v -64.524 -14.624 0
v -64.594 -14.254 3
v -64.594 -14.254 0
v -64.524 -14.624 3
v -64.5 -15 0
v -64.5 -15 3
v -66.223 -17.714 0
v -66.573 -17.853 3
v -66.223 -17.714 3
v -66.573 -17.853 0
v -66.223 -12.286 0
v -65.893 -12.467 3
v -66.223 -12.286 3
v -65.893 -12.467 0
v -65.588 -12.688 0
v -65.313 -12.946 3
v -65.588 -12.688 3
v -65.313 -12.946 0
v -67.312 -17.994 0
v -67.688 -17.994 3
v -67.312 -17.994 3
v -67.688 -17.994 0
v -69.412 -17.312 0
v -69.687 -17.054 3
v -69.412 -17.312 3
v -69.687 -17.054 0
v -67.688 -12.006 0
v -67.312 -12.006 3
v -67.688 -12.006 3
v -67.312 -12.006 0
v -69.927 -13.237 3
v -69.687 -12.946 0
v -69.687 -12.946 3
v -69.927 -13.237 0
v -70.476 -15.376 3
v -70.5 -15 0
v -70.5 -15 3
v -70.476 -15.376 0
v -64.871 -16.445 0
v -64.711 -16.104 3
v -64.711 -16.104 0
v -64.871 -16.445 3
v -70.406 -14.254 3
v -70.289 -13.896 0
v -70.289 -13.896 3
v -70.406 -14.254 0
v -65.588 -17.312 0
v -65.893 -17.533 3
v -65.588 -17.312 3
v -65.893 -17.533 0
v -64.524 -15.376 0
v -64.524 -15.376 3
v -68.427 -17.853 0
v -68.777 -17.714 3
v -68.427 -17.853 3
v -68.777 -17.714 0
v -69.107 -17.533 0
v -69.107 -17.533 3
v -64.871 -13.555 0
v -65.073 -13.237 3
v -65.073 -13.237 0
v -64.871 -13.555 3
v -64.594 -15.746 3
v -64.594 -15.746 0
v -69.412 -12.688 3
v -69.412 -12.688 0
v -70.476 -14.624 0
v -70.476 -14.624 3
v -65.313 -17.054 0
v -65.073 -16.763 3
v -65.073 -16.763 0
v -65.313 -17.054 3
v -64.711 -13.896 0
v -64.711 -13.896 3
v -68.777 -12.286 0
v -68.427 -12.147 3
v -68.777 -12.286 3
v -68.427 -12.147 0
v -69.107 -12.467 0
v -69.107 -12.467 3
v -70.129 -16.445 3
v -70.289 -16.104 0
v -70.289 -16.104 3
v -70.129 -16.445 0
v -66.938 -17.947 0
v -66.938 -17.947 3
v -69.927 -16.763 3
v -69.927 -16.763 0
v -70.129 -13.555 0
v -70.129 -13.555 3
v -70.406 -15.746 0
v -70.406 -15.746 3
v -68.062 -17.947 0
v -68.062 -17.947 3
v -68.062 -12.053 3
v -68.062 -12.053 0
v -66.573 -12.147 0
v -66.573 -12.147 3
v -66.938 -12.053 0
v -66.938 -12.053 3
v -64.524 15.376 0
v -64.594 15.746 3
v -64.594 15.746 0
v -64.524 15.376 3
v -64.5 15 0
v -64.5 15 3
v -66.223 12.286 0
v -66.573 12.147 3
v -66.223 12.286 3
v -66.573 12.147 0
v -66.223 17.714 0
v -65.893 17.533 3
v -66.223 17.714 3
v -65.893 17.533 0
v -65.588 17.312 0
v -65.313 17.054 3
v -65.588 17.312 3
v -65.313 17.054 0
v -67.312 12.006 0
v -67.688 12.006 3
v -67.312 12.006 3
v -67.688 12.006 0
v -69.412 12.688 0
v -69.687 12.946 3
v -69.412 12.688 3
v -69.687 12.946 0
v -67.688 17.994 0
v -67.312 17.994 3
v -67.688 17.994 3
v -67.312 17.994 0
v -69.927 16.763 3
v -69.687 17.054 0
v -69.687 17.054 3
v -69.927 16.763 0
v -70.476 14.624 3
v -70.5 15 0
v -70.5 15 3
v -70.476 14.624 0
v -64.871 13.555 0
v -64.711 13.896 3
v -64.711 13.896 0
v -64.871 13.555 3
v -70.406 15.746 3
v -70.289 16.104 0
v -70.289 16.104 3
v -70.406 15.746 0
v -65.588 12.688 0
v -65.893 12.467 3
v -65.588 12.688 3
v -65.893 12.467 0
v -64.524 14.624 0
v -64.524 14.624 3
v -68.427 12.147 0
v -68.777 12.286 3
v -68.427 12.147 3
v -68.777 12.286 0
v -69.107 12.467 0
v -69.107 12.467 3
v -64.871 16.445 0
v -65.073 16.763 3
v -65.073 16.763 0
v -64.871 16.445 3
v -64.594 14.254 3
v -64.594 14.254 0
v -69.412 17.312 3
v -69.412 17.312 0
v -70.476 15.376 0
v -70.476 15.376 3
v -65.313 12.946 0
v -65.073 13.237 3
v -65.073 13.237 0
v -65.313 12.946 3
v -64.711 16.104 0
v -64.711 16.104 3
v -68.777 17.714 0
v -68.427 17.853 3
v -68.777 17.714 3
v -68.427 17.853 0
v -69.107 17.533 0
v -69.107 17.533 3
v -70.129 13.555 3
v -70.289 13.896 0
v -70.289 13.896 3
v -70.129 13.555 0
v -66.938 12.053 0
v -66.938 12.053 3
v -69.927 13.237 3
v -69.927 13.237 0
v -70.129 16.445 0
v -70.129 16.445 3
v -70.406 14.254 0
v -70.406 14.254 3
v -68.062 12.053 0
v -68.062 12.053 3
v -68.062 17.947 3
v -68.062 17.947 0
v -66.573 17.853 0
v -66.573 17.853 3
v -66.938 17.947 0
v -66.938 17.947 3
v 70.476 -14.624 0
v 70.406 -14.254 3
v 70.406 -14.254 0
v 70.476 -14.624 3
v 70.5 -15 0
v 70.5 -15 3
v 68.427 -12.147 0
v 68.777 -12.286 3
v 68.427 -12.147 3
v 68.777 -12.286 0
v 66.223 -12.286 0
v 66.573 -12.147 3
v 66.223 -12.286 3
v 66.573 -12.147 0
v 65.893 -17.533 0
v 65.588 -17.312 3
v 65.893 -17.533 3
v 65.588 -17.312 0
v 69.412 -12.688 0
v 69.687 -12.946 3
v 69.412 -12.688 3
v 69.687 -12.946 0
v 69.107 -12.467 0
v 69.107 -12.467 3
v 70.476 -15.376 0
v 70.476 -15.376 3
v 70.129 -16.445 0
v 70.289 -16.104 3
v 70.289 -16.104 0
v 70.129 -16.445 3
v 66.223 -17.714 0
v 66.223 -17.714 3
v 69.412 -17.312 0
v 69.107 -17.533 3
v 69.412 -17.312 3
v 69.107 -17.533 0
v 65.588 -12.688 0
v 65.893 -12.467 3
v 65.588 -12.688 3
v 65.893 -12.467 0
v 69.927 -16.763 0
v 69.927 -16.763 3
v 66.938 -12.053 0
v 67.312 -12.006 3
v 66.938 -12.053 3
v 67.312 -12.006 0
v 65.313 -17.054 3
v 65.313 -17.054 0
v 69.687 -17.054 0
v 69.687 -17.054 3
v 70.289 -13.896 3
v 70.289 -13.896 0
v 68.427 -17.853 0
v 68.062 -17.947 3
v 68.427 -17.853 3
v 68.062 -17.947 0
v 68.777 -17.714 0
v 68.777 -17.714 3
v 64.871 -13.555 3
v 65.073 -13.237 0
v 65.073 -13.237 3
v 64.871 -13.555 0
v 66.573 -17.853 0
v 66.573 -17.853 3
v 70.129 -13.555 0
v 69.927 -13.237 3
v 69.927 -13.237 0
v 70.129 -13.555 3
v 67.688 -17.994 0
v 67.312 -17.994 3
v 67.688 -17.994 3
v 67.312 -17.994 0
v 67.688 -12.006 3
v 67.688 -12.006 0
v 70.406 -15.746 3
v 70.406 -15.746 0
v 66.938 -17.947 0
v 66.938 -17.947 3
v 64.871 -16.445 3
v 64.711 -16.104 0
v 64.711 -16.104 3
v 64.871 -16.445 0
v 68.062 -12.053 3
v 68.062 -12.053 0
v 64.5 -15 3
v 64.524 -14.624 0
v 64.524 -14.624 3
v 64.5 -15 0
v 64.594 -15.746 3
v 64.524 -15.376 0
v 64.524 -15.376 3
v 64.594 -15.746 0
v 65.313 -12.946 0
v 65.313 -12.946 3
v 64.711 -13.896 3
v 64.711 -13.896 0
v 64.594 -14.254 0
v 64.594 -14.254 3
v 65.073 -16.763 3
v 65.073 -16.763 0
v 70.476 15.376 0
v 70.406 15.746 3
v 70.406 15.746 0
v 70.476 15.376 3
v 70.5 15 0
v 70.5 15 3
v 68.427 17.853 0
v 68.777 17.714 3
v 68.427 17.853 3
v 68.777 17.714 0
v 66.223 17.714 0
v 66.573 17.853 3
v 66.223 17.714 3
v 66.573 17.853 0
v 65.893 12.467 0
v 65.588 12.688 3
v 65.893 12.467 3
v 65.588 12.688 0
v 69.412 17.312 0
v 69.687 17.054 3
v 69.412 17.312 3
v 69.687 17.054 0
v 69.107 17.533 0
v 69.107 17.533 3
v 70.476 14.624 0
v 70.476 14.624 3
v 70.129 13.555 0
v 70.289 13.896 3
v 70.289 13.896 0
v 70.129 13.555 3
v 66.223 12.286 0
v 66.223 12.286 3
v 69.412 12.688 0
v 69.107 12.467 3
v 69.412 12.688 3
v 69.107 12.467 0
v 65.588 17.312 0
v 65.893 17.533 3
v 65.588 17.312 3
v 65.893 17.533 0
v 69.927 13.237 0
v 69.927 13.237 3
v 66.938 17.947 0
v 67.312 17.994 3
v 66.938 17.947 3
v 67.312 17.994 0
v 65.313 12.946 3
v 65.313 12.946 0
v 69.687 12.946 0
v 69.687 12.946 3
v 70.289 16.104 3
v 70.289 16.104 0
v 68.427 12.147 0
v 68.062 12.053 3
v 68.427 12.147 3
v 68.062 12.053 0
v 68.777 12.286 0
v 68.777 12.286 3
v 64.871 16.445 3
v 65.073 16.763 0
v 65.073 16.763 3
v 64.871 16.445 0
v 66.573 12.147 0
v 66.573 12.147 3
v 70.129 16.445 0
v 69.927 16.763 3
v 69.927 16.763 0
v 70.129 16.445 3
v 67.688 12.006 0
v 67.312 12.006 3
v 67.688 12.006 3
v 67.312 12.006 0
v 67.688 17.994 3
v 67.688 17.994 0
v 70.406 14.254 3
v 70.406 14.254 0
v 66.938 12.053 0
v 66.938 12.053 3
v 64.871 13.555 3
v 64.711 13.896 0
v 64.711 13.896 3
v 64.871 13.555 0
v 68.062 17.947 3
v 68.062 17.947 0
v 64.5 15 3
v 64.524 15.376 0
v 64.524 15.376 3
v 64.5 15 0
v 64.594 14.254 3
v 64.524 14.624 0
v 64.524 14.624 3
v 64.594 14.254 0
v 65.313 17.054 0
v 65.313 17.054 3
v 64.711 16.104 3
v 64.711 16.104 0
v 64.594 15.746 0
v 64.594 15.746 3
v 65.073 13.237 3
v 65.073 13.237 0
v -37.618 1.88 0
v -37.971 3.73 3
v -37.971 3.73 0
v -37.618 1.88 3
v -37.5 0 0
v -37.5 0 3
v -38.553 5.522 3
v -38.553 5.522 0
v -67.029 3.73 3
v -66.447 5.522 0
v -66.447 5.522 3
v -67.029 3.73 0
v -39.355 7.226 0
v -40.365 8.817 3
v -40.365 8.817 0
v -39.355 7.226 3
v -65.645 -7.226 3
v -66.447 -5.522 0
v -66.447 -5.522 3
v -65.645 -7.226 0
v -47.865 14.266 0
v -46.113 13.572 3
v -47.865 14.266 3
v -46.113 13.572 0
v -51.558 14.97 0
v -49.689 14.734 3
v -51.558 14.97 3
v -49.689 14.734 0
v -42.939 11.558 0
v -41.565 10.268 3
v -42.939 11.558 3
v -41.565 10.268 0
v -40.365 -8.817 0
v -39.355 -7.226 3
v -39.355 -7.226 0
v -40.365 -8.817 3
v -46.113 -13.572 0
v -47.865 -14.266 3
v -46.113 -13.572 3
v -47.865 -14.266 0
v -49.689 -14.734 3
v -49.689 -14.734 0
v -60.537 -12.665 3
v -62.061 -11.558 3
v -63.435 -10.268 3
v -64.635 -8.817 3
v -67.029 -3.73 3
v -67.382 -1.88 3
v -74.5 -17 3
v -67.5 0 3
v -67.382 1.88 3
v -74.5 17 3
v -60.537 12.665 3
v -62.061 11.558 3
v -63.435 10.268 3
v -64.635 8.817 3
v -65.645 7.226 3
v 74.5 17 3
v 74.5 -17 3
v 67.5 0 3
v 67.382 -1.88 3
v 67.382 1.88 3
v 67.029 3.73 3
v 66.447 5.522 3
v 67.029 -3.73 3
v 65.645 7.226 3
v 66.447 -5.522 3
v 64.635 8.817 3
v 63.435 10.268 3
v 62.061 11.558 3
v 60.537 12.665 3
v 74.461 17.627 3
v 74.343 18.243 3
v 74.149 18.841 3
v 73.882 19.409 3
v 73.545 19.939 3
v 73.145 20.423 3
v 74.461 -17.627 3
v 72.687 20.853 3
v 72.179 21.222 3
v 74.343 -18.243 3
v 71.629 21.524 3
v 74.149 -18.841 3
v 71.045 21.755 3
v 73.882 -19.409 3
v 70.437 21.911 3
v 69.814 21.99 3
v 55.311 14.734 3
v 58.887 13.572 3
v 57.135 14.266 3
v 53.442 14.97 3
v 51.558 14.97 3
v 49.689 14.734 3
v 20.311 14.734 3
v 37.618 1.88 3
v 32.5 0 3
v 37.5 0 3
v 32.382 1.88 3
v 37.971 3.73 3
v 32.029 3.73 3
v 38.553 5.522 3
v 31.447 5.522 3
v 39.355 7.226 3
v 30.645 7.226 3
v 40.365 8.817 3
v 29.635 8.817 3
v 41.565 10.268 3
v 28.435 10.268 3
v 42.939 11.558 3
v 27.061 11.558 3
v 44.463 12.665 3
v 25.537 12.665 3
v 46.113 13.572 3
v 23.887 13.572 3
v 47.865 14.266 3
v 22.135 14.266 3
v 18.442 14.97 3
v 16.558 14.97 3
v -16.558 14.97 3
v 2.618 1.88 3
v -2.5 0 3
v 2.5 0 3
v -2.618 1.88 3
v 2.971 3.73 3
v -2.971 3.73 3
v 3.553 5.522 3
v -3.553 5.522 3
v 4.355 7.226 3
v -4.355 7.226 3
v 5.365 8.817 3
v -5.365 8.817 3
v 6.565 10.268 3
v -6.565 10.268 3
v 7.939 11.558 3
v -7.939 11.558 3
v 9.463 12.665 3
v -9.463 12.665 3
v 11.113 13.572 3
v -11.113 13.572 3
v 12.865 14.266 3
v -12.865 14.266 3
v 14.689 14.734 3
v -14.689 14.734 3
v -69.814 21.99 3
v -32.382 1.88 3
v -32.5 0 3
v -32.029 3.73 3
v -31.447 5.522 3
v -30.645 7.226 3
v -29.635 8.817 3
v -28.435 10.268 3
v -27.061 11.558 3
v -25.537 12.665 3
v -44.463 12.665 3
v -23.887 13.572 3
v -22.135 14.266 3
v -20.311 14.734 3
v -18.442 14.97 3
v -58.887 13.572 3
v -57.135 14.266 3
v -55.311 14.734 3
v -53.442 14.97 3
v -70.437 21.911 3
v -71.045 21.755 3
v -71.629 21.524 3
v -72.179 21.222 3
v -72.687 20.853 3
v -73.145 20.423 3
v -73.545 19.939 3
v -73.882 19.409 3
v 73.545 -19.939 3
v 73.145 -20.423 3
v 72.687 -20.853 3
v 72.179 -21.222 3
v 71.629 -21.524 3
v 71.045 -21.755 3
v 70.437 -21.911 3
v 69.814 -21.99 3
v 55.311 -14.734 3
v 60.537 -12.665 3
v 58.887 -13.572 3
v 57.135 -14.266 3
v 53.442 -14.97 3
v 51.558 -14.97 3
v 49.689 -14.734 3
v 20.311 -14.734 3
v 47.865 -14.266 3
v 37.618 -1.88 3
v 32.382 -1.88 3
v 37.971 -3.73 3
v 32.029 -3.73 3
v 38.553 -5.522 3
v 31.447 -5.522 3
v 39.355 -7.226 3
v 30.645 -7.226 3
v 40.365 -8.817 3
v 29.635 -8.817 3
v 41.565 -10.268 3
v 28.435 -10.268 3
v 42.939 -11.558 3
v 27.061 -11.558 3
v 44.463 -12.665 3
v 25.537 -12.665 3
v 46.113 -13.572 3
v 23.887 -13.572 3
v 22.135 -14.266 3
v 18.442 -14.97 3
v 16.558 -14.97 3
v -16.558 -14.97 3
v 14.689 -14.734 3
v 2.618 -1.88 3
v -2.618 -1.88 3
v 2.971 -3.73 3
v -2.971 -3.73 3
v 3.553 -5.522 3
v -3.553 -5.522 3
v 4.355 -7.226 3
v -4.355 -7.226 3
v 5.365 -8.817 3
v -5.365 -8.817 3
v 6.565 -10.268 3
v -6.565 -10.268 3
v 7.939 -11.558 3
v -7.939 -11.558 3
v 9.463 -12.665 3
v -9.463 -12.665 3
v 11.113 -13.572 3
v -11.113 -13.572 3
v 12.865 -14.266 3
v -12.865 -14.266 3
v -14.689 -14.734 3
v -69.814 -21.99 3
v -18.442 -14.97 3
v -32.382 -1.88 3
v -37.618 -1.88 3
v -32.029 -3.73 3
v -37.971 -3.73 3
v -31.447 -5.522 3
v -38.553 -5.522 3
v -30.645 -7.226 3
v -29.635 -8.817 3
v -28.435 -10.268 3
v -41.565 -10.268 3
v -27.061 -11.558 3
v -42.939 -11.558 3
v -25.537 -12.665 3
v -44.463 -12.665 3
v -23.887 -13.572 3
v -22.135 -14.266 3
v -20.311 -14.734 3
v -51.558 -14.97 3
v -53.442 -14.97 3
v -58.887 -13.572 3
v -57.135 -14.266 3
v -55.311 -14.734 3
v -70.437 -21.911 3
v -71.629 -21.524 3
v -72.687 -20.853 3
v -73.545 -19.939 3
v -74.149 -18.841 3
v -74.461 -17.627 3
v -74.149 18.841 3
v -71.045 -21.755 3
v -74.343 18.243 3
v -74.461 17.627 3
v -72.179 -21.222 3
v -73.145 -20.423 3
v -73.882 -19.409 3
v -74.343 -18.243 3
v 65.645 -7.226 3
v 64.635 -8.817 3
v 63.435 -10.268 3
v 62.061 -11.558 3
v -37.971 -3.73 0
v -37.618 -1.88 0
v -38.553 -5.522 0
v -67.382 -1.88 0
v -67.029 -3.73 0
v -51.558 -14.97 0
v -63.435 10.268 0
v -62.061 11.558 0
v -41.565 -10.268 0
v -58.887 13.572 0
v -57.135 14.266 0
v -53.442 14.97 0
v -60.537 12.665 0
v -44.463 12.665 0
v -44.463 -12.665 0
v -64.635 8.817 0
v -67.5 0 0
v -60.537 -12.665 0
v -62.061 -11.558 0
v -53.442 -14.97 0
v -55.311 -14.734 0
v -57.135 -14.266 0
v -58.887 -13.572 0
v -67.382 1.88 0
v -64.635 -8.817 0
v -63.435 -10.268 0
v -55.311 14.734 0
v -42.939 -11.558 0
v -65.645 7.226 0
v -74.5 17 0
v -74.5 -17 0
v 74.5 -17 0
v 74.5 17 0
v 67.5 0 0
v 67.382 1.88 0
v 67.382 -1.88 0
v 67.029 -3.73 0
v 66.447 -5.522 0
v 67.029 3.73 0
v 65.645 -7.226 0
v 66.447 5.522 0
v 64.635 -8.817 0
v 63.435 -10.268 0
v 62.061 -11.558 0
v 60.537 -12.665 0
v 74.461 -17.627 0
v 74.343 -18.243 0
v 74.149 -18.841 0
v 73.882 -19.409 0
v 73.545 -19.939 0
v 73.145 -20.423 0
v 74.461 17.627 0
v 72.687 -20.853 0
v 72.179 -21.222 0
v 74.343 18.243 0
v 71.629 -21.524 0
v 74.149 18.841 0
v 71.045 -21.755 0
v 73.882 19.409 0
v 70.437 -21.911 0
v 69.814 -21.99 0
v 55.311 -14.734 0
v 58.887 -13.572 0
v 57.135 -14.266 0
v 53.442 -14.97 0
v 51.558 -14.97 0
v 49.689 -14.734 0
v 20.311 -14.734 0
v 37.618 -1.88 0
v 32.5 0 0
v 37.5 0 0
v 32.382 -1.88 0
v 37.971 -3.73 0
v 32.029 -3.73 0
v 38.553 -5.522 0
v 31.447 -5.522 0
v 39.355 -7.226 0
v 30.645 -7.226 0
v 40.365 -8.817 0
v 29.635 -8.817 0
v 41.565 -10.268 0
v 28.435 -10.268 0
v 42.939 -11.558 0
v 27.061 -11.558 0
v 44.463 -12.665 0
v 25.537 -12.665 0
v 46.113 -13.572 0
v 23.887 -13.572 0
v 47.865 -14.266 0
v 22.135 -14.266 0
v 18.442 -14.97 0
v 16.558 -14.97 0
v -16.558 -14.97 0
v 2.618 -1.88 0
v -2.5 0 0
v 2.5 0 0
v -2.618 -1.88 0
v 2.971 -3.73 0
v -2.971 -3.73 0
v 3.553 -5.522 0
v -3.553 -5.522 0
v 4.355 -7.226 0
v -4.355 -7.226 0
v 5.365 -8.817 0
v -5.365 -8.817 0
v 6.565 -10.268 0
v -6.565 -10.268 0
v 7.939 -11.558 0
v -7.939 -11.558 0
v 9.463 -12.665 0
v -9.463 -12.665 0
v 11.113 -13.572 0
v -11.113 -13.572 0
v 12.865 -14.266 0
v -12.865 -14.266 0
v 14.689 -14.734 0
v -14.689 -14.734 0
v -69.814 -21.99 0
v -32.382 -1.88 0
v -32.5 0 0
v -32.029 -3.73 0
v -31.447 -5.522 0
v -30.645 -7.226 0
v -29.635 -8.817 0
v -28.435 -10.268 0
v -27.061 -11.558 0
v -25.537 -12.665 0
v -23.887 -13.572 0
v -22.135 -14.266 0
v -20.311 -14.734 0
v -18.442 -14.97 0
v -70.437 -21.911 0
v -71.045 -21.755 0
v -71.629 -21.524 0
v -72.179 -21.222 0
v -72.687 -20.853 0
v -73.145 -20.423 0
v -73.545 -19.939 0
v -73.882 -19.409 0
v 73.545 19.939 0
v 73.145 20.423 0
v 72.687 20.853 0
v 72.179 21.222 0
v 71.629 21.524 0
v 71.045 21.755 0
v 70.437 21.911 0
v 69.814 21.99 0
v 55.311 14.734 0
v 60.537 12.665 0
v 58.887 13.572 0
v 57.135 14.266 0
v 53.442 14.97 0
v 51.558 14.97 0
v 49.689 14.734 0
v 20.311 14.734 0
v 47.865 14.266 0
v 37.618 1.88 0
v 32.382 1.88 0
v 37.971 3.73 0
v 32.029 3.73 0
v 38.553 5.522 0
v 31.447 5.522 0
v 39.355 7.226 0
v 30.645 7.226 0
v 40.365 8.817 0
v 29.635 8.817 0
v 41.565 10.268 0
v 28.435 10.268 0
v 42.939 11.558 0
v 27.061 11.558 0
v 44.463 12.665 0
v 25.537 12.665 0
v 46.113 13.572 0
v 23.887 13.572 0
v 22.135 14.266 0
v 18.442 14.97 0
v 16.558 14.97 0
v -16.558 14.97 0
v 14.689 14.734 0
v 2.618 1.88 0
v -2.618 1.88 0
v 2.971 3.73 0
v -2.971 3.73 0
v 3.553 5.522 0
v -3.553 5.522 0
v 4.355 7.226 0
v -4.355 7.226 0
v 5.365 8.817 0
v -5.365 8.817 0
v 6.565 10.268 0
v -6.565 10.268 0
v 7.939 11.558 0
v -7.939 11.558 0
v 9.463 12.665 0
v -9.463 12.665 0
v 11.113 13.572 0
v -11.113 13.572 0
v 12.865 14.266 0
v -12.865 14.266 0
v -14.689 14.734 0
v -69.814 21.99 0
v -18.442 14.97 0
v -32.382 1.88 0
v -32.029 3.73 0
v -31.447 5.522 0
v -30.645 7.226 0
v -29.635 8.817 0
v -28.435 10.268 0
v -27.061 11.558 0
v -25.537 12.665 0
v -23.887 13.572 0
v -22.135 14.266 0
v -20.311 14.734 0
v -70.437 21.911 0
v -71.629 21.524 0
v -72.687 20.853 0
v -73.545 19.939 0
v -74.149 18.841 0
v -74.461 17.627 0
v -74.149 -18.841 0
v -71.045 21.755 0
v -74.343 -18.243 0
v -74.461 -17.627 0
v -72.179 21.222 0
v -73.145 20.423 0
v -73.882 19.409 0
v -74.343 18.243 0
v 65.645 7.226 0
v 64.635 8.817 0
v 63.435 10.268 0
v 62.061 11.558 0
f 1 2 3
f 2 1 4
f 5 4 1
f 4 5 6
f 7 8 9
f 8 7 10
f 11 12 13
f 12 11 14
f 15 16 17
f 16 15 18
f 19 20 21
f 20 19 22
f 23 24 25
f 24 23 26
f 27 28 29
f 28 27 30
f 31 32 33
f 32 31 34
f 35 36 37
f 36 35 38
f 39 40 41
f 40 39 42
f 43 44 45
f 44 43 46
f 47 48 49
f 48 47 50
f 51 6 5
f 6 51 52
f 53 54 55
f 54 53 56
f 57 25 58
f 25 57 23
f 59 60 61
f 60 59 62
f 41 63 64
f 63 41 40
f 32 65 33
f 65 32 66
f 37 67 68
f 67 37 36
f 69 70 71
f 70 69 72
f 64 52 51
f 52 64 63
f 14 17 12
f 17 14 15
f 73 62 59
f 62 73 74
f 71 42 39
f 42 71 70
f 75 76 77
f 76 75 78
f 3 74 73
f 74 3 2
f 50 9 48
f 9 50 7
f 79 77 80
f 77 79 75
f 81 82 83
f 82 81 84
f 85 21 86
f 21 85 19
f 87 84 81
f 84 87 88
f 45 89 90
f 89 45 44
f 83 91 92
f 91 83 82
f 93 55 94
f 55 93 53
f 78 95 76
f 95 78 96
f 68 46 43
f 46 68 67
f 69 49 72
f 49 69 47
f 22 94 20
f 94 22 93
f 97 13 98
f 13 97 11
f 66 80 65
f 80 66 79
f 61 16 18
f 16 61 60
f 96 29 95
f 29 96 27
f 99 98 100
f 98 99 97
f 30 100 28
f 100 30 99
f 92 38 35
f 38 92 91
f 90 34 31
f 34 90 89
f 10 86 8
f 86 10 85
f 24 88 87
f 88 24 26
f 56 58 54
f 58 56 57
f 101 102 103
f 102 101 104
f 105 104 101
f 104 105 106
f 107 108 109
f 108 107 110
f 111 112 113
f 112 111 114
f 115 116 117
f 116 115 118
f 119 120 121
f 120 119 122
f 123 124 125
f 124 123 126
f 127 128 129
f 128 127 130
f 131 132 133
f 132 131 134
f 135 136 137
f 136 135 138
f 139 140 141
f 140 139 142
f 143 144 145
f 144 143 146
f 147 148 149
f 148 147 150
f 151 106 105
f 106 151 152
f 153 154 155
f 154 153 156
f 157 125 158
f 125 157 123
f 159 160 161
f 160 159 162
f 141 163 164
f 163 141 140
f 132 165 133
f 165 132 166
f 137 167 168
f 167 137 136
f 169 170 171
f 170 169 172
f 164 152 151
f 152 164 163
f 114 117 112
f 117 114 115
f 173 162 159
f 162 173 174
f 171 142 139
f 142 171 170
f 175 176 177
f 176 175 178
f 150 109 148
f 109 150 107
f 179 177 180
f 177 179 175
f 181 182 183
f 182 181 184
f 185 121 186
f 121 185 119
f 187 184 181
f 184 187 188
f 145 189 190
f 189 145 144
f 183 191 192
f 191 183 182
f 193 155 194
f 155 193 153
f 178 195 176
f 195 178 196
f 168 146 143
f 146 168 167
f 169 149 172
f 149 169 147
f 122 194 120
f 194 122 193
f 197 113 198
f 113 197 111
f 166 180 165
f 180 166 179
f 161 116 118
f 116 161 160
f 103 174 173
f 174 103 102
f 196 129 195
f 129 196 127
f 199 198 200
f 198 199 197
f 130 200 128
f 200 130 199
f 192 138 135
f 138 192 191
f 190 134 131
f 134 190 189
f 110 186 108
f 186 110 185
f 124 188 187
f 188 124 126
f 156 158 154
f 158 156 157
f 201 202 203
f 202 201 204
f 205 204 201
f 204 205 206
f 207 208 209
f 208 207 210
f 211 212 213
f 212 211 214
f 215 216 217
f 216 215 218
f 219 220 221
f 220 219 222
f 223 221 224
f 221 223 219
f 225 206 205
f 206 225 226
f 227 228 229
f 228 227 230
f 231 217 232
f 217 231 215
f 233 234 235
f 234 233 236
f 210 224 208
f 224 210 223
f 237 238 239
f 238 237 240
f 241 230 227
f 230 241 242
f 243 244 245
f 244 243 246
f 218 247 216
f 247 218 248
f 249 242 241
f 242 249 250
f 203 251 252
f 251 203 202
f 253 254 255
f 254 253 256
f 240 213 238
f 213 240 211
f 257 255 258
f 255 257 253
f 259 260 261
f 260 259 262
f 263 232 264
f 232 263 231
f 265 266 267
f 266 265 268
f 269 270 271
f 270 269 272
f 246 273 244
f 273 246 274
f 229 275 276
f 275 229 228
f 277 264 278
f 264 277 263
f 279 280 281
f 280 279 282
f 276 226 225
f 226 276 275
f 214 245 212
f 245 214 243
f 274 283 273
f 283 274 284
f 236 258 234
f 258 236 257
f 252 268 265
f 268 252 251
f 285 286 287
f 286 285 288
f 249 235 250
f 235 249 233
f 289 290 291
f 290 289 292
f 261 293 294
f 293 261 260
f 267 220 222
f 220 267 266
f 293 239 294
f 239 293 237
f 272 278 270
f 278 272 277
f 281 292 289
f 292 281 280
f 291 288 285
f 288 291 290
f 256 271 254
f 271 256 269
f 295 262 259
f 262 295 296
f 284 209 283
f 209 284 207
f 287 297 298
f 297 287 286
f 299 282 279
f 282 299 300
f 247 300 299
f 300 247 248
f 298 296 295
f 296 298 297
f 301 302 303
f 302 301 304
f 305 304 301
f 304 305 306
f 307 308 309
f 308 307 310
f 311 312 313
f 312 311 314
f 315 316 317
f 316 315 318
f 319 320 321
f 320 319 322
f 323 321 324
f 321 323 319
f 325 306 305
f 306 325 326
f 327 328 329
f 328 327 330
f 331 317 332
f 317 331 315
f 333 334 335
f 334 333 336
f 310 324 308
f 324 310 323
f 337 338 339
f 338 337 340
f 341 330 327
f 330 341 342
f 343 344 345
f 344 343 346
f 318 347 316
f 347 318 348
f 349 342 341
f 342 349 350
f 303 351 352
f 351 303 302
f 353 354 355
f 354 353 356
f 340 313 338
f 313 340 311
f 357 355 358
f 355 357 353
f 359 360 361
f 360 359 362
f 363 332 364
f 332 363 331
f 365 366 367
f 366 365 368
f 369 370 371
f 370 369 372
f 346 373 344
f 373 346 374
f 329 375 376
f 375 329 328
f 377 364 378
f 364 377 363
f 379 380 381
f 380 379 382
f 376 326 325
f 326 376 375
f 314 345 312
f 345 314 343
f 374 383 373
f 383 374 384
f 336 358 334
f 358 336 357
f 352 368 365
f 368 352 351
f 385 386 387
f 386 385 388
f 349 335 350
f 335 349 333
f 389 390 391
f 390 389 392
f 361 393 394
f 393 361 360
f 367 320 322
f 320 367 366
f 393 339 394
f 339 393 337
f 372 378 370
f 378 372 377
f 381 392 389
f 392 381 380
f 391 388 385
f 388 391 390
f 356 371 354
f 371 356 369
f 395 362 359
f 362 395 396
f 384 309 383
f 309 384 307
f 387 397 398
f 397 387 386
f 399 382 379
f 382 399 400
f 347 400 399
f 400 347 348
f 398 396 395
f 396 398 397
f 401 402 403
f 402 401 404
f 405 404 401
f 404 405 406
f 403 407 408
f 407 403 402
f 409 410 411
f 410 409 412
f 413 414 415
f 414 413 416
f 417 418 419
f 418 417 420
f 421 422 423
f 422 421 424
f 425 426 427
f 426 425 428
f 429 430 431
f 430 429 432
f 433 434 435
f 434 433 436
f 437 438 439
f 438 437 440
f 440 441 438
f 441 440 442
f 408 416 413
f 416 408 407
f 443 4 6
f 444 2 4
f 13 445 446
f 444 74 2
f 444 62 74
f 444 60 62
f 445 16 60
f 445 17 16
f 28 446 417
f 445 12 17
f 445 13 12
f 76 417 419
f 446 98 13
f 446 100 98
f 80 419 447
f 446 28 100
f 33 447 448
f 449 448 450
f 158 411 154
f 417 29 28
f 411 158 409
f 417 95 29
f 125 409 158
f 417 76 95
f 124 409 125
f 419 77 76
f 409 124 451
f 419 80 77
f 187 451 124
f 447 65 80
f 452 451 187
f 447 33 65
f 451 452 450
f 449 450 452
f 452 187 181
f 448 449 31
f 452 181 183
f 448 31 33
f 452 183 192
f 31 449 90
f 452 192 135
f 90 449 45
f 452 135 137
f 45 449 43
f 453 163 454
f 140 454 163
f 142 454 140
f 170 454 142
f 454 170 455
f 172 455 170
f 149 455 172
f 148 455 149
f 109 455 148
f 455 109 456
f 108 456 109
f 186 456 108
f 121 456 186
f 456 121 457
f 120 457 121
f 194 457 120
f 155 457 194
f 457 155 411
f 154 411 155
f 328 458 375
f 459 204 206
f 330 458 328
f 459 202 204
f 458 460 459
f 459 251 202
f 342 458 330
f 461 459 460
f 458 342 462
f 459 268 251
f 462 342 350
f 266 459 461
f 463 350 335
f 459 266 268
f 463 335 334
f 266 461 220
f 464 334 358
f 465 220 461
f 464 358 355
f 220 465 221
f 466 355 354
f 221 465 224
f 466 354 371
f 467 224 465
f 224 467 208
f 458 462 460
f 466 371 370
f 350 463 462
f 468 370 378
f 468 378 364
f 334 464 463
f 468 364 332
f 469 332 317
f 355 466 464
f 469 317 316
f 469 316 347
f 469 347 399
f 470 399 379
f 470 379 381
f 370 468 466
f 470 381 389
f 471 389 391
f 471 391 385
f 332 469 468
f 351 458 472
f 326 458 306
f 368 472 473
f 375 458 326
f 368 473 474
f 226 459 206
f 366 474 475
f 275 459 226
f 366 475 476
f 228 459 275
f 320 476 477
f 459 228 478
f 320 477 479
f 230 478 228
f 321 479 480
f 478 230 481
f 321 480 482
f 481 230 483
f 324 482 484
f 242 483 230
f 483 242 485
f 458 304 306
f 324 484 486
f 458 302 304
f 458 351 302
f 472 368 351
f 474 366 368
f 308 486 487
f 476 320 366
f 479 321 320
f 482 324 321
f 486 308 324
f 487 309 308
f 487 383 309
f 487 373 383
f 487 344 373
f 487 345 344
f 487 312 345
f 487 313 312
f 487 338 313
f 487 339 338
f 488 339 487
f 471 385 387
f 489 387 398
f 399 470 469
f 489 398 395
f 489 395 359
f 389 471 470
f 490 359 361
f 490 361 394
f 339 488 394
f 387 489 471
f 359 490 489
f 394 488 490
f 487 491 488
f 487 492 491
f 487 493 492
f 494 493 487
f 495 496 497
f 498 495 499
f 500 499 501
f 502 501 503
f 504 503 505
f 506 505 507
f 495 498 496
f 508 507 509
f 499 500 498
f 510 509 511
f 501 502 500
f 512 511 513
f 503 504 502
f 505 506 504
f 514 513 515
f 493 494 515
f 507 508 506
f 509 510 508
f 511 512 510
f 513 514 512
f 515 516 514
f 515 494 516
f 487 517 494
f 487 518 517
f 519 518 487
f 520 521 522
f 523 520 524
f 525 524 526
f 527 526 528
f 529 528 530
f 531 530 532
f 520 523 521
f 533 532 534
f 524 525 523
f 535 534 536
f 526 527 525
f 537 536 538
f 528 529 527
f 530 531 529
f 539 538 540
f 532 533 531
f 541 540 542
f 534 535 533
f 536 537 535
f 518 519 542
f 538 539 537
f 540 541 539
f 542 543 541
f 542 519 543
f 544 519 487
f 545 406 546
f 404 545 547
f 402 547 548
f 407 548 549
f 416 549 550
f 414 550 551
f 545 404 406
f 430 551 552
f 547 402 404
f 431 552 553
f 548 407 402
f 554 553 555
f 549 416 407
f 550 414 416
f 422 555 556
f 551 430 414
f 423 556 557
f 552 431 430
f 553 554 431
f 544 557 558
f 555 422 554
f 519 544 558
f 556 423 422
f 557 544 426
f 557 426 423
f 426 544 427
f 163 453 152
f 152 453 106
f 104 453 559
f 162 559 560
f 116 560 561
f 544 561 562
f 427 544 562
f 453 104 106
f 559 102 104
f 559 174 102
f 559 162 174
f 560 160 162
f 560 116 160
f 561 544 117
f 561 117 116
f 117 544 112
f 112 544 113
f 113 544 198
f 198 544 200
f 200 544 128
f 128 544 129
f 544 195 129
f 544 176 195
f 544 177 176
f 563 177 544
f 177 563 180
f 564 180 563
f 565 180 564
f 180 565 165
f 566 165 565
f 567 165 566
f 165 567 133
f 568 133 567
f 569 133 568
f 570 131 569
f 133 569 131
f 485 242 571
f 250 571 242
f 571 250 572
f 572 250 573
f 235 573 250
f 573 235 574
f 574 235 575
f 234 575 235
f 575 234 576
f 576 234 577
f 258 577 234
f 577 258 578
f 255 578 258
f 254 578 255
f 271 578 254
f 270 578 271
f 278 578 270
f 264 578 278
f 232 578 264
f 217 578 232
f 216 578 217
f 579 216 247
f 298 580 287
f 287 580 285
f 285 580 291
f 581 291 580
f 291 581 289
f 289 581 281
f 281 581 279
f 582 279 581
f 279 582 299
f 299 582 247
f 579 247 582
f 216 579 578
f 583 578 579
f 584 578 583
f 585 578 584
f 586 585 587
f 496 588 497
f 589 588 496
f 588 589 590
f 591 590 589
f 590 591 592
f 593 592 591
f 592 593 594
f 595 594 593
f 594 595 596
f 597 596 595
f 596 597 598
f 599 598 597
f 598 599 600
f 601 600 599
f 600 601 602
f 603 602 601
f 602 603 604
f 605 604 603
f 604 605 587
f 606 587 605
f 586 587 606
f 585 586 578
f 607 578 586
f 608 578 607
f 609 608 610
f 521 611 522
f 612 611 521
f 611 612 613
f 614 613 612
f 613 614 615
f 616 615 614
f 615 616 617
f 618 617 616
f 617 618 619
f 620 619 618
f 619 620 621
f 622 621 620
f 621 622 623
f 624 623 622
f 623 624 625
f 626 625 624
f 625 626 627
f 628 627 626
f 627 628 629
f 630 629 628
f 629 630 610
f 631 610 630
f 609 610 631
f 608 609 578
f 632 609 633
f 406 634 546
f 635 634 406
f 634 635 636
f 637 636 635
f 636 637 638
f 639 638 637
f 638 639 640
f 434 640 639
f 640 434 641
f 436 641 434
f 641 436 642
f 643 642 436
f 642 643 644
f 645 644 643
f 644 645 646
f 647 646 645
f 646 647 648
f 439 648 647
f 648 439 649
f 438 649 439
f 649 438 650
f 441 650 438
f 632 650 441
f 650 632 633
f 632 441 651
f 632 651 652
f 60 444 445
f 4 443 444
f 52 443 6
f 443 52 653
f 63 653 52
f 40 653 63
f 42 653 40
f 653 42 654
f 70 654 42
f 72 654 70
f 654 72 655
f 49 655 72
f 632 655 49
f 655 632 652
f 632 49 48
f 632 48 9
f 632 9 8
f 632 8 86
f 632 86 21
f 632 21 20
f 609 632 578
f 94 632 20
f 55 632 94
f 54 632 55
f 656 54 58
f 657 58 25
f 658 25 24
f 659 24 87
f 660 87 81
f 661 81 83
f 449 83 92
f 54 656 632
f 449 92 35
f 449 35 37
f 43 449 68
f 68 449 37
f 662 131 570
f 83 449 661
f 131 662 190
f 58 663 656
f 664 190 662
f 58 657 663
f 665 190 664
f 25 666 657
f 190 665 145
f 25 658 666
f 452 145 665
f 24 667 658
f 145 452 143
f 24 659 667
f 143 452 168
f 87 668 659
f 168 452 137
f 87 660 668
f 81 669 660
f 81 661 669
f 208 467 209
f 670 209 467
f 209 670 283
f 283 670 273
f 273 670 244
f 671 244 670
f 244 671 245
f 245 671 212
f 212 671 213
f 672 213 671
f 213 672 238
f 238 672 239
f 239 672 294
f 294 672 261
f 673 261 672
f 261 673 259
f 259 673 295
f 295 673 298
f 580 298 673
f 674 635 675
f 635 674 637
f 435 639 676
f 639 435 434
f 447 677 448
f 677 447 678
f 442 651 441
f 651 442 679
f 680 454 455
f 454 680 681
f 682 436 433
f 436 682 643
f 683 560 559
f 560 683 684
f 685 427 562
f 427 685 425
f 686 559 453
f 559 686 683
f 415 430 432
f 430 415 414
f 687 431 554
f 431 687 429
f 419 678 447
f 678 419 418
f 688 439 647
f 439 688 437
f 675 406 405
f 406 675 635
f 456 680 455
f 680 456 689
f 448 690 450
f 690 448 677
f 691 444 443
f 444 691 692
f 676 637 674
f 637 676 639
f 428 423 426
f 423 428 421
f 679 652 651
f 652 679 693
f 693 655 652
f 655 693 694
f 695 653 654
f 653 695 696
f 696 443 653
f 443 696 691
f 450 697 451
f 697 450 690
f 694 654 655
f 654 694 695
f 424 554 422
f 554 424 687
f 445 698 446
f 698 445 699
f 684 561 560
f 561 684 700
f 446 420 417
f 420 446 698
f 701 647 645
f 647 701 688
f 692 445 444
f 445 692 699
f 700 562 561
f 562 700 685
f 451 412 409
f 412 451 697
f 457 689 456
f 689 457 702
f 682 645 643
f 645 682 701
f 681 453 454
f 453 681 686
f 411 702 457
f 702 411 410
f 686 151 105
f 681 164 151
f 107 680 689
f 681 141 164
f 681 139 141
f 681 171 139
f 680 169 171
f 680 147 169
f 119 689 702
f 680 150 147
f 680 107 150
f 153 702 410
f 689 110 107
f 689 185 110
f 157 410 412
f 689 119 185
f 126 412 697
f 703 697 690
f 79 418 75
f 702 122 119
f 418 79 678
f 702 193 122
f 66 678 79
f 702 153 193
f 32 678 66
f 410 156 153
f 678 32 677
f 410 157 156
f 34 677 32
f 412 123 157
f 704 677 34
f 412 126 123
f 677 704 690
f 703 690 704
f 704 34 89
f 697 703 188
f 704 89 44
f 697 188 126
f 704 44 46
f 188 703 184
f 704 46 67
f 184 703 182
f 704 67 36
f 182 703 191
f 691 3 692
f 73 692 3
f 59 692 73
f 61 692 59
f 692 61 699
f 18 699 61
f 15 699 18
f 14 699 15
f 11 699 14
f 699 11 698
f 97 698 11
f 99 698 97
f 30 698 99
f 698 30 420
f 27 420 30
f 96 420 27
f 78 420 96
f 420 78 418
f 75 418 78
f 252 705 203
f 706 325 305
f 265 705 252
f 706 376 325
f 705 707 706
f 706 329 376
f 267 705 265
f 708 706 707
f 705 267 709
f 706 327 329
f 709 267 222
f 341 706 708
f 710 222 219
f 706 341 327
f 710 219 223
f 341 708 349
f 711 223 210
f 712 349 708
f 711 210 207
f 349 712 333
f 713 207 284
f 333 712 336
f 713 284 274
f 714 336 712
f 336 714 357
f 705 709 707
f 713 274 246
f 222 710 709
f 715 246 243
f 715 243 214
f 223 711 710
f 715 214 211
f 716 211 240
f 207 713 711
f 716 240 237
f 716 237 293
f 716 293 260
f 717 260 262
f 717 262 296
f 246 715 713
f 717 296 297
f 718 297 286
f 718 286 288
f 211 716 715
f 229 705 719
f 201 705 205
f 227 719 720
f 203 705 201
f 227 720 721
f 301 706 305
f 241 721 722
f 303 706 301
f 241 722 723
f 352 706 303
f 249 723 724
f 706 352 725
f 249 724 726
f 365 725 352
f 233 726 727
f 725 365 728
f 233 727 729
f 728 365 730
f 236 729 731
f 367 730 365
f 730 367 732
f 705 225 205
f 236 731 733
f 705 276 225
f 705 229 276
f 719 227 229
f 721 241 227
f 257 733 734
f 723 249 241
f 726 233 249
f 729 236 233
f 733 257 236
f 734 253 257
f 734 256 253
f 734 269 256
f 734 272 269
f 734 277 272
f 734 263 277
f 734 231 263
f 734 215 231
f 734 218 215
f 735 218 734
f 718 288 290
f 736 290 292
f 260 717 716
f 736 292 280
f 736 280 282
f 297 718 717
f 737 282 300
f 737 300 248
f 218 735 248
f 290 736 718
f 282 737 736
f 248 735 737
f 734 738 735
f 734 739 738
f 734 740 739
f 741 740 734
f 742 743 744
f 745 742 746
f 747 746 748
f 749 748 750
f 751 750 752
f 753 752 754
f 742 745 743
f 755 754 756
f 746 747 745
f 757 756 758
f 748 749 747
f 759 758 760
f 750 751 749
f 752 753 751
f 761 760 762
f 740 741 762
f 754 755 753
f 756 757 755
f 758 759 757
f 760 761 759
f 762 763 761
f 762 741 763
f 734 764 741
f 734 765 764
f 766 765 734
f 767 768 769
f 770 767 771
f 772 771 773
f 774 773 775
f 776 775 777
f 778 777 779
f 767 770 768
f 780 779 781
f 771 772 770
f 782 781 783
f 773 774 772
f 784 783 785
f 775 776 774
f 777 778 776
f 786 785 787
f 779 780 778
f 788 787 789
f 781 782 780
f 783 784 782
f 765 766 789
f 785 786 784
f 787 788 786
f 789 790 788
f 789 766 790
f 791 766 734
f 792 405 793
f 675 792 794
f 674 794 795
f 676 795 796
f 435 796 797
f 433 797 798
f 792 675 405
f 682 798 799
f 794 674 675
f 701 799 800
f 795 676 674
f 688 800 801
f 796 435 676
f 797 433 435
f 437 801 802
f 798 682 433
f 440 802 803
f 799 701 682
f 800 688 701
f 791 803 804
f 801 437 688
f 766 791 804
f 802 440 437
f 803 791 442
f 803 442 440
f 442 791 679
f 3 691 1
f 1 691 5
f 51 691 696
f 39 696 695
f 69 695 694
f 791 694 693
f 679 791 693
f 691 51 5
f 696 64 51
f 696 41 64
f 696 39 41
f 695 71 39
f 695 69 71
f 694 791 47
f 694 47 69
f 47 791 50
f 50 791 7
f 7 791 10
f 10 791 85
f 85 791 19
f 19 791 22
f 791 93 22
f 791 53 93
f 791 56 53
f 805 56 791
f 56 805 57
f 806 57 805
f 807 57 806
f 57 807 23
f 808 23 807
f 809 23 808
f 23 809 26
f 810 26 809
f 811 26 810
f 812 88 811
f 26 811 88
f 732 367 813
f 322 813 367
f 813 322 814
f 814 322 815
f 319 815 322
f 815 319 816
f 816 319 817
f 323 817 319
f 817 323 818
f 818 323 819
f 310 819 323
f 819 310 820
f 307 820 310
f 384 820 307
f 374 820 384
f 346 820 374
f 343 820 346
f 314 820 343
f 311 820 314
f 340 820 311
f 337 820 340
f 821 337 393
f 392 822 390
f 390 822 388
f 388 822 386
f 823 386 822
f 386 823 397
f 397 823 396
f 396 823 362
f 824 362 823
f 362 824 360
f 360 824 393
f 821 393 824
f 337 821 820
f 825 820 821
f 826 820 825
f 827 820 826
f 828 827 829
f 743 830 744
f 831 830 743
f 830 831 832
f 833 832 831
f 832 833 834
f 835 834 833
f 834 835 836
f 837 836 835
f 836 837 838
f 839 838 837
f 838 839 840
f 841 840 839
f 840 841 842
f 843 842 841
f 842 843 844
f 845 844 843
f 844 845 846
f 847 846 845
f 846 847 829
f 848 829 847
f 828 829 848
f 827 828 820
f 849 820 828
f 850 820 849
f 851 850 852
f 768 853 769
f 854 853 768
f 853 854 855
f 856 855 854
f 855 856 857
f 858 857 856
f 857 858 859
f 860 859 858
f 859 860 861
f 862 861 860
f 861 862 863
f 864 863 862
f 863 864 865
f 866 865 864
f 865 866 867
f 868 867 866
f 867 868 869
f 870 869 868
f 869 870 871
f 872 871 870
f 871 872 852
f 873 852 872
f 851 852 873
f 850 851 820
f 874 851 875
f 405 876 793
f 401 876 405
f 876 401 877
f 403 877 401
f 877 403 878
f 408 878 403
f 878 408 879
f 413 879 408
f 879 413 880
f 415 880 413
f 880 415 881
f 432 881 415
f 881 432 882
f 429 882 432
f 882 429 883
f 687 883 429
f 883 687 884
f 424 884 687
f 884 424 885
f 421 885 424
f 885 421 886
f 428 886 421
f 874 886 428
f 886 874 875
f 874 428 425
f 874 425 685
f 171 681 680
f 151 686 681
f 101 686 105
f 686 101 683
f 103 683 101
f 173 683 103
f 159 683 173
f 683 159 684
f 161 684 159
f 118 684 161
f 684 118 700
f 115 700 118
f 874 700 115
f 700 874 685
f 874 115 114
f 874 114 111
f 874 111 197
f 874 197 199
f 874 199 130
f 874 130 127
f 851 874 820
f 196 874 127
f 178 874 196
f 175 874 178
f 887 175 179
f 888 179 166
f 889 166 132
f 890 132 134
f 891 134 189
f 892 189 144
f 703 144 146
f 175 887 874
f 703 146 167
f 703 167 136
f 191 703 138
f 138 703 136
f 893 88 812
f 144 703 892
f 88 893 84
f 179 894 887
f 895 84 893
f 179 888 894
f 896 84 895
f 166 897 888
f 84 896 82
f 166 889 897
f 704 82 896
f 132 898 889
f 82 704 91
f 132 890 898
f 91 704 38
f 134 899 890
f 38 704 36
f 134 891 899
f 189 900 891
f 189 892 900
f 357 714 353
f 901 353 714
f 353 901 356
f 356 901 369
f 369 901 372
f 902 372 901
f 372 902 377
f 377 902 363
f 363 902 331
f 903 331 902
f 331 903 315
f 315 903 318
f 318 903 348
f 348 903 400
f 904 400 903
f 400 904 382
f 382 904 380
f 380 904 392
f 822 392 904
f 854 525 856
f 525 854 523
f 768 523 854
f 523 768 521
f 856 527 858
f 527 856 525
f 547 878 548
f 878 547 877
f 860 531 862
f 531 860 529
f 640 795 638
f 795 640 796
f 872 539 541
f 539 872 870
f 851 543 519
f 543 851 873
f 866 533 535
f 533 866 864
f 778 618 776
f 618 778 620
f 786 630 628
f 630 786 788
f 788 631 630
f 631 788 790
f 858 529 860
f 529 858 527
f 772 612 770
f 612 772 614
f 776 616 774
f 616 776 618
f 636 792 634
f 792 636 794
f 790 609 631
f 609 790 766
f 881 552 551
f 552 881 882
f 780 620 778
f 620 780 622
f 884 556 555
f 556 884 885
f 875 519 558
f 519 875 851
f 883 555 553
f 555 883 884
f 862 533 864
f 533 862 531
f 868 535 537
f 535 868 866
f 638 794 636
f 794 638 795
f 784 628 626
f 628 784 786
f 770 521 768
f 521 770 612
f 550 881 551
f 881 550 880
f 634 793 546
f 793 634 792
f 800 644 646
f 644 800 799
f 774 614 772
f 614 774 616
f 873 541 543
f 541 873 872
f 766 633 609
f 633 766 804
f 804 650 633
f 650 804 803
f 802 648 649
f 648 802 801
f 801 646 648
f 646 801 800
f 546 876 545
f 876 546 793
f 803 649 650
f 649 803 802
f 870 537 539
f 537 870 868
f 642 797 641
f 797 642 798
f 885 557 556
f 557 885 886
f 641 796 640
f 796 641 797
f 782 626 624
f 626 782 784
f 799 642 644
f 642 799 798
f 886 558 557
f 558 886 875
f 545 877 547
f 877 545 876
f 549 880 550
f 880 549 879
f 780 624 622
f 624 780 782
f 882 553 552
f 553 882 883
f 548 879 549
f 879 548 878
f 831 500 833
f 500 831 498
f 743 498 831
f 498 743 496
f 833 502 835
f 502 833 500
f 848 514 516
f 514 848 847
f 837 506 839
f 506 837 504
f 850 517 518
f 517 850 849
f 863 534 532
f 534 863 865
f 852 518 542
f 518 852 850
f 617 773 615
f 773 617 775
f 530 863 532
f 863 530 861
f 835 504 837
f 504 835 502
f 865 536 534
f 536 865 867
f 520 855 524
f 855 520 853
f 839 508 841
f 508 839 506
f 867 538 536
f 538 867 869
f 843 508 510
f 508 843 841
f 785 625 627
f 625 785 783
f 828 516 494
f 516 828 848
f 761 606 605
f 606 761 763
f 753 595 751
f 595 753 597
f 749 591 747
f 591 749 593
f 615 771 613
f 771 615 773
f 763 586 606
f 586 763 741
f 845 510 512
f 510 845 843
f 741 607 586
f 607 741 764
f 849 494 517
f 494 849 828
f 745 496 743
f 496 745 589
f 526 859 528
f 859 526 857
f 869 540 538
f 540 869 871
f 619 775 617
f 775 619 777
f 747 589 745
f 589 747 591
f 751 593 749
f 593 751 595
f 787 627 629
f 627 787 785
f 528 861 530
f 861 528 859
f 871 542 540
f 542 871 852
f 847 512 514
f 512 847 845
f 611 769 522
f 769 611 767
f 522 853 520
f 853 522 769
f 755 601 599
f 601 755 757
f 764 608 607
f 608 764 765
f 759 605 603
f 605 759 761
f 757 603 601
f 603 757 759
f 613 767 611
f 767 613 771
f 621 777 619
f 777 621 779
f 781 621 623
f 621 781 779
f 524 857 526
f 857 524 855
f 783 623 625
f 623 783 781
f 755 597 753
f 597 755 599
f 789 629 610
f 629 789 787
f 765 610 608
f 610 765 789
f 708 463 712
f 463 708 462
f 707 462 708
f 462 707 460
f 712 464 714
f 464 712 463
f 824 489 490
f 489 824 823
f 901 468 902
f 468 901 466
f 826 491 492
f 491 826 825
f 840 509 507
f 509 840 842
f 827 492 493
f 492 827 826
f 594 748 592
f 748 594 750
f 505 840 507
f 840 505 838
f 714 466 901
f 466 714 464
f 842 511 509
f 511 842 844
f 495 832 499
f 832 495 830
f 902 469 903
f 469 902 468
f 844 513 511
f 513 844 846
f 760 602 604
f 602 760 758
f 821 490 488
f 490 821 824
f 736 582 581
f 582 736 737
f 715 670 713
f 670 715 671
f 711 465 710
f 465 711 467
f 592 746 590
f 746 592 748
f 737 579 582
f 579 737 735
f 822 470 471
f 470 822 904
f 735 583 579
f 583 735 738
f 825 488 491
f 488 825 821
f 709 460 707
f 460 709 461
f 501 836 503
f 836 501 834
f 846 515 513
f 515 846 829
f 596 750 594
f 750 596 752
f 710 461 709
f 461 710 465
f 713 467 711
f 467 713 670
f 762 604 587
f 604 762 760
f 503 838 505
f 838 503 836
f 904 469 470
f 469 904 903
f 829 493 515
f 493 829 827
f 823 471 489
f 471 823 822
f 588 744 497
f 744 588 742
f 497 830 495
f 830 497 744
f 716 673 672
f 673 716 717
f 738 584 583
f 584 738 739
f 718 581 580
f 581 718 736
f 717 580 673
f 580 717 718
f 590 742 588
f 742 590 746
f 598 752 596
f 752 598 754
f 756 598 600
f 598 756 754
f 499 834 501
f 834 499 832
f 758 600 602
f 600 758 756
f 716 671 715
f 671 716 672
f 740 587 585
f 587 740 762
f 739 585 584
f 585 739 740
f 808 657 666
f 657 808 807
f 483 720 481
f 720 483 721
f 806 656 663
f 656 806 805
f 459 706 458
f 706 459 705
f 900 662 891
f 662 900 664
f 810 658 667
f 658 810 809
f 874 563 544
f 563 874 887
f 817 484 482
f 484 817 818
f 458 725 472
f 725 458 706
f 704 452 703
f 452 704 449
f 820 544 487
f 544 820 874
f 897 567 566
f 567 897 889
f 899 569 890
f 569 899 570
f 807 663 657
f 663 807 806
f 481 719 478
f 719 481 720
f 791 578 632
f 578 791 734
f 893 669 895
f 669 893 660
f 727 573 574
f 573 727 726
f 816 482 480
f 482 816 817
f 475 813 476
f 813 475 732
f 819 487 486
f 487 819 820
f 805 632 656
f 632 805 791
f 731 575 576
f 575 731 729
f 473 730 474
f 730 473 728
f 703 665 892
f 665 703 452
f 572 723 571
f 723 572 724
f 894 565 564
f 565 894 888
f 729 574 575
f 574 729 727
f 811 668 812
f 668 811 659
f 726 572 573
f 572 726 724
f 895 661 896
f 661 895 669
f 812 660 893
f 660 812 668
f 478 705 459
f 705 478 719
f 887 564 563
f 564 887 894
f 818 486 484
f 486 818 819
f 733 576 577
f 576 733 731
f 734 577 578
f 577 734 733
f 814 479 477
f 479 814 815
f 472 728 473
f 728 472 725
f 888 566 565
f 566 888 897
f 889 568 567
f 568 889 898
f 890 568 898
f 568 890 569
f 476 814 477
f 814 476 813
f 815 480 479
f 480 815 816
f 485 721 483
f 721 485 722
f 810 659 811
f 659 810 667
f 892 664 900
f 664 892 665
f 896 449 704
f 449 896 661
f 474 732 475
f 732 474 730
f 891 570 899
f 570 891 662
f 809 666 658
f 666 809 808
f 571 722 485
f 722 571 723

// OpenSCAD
$fn = 50;


difference() {
	union() {
		hull() {
			translate(v = [-69.5000000000, 17.0000000000, 0]) {
				cylinder(h = 3, r = 5);
			}
			translate(v = [69.5000000000, 17.0000000000, 0]) {
				cylinder(h = 3, r = 5);
			}
			translate(v = [-69.5000000000, -17.0000000000, 0]) {
				cylinder(h = 3, r = 5);
			}
			translate(v = [69.5000000000, -17.0000000000, 0]) {
				cylinder(h = 3, r = 5);
			}
		}
	}
	union() {
		#translate(v = [-67.5000000000, -15.0000000000, -100.0000000000]) {
			cylinder(h = 200, r = 3.0000000000);
		}
		#translate(v = [-67.5000000000, 15.0000000000, -100.0000000000]) {
			cylinder(h = 200, r = 3.0000000000);
		}
		#translate(v = [67.5000000000, -15.0000000000, -100.0000000000]) {
			cylinder(h = 200, r = 3.0000000000);
		}
		#translate(v = [67.5000000000, 15.0000000000, -100.0000000000]) {
			cylinder(h = 200, r = 3.0000000000);
		}
		#translate(v = [-52.5000000000, 0, 0]) {
			cylinder(h = 3, r = 15.0000000000);
		}
		#translate(v = [-17.5000000000, 0, 0]) {
			cylinder(h = 3, r = 15.0000000000);
		}
		#translate(v = [17.5000000000, 0, 0]) {
			cylinder(h = 3, r = 15.0000000000);
		}
		#translate(v = [52.5000000000, 0, 0]) {
			cylinder(h = 3, r = 15.0000000000);
		}
	}
}
